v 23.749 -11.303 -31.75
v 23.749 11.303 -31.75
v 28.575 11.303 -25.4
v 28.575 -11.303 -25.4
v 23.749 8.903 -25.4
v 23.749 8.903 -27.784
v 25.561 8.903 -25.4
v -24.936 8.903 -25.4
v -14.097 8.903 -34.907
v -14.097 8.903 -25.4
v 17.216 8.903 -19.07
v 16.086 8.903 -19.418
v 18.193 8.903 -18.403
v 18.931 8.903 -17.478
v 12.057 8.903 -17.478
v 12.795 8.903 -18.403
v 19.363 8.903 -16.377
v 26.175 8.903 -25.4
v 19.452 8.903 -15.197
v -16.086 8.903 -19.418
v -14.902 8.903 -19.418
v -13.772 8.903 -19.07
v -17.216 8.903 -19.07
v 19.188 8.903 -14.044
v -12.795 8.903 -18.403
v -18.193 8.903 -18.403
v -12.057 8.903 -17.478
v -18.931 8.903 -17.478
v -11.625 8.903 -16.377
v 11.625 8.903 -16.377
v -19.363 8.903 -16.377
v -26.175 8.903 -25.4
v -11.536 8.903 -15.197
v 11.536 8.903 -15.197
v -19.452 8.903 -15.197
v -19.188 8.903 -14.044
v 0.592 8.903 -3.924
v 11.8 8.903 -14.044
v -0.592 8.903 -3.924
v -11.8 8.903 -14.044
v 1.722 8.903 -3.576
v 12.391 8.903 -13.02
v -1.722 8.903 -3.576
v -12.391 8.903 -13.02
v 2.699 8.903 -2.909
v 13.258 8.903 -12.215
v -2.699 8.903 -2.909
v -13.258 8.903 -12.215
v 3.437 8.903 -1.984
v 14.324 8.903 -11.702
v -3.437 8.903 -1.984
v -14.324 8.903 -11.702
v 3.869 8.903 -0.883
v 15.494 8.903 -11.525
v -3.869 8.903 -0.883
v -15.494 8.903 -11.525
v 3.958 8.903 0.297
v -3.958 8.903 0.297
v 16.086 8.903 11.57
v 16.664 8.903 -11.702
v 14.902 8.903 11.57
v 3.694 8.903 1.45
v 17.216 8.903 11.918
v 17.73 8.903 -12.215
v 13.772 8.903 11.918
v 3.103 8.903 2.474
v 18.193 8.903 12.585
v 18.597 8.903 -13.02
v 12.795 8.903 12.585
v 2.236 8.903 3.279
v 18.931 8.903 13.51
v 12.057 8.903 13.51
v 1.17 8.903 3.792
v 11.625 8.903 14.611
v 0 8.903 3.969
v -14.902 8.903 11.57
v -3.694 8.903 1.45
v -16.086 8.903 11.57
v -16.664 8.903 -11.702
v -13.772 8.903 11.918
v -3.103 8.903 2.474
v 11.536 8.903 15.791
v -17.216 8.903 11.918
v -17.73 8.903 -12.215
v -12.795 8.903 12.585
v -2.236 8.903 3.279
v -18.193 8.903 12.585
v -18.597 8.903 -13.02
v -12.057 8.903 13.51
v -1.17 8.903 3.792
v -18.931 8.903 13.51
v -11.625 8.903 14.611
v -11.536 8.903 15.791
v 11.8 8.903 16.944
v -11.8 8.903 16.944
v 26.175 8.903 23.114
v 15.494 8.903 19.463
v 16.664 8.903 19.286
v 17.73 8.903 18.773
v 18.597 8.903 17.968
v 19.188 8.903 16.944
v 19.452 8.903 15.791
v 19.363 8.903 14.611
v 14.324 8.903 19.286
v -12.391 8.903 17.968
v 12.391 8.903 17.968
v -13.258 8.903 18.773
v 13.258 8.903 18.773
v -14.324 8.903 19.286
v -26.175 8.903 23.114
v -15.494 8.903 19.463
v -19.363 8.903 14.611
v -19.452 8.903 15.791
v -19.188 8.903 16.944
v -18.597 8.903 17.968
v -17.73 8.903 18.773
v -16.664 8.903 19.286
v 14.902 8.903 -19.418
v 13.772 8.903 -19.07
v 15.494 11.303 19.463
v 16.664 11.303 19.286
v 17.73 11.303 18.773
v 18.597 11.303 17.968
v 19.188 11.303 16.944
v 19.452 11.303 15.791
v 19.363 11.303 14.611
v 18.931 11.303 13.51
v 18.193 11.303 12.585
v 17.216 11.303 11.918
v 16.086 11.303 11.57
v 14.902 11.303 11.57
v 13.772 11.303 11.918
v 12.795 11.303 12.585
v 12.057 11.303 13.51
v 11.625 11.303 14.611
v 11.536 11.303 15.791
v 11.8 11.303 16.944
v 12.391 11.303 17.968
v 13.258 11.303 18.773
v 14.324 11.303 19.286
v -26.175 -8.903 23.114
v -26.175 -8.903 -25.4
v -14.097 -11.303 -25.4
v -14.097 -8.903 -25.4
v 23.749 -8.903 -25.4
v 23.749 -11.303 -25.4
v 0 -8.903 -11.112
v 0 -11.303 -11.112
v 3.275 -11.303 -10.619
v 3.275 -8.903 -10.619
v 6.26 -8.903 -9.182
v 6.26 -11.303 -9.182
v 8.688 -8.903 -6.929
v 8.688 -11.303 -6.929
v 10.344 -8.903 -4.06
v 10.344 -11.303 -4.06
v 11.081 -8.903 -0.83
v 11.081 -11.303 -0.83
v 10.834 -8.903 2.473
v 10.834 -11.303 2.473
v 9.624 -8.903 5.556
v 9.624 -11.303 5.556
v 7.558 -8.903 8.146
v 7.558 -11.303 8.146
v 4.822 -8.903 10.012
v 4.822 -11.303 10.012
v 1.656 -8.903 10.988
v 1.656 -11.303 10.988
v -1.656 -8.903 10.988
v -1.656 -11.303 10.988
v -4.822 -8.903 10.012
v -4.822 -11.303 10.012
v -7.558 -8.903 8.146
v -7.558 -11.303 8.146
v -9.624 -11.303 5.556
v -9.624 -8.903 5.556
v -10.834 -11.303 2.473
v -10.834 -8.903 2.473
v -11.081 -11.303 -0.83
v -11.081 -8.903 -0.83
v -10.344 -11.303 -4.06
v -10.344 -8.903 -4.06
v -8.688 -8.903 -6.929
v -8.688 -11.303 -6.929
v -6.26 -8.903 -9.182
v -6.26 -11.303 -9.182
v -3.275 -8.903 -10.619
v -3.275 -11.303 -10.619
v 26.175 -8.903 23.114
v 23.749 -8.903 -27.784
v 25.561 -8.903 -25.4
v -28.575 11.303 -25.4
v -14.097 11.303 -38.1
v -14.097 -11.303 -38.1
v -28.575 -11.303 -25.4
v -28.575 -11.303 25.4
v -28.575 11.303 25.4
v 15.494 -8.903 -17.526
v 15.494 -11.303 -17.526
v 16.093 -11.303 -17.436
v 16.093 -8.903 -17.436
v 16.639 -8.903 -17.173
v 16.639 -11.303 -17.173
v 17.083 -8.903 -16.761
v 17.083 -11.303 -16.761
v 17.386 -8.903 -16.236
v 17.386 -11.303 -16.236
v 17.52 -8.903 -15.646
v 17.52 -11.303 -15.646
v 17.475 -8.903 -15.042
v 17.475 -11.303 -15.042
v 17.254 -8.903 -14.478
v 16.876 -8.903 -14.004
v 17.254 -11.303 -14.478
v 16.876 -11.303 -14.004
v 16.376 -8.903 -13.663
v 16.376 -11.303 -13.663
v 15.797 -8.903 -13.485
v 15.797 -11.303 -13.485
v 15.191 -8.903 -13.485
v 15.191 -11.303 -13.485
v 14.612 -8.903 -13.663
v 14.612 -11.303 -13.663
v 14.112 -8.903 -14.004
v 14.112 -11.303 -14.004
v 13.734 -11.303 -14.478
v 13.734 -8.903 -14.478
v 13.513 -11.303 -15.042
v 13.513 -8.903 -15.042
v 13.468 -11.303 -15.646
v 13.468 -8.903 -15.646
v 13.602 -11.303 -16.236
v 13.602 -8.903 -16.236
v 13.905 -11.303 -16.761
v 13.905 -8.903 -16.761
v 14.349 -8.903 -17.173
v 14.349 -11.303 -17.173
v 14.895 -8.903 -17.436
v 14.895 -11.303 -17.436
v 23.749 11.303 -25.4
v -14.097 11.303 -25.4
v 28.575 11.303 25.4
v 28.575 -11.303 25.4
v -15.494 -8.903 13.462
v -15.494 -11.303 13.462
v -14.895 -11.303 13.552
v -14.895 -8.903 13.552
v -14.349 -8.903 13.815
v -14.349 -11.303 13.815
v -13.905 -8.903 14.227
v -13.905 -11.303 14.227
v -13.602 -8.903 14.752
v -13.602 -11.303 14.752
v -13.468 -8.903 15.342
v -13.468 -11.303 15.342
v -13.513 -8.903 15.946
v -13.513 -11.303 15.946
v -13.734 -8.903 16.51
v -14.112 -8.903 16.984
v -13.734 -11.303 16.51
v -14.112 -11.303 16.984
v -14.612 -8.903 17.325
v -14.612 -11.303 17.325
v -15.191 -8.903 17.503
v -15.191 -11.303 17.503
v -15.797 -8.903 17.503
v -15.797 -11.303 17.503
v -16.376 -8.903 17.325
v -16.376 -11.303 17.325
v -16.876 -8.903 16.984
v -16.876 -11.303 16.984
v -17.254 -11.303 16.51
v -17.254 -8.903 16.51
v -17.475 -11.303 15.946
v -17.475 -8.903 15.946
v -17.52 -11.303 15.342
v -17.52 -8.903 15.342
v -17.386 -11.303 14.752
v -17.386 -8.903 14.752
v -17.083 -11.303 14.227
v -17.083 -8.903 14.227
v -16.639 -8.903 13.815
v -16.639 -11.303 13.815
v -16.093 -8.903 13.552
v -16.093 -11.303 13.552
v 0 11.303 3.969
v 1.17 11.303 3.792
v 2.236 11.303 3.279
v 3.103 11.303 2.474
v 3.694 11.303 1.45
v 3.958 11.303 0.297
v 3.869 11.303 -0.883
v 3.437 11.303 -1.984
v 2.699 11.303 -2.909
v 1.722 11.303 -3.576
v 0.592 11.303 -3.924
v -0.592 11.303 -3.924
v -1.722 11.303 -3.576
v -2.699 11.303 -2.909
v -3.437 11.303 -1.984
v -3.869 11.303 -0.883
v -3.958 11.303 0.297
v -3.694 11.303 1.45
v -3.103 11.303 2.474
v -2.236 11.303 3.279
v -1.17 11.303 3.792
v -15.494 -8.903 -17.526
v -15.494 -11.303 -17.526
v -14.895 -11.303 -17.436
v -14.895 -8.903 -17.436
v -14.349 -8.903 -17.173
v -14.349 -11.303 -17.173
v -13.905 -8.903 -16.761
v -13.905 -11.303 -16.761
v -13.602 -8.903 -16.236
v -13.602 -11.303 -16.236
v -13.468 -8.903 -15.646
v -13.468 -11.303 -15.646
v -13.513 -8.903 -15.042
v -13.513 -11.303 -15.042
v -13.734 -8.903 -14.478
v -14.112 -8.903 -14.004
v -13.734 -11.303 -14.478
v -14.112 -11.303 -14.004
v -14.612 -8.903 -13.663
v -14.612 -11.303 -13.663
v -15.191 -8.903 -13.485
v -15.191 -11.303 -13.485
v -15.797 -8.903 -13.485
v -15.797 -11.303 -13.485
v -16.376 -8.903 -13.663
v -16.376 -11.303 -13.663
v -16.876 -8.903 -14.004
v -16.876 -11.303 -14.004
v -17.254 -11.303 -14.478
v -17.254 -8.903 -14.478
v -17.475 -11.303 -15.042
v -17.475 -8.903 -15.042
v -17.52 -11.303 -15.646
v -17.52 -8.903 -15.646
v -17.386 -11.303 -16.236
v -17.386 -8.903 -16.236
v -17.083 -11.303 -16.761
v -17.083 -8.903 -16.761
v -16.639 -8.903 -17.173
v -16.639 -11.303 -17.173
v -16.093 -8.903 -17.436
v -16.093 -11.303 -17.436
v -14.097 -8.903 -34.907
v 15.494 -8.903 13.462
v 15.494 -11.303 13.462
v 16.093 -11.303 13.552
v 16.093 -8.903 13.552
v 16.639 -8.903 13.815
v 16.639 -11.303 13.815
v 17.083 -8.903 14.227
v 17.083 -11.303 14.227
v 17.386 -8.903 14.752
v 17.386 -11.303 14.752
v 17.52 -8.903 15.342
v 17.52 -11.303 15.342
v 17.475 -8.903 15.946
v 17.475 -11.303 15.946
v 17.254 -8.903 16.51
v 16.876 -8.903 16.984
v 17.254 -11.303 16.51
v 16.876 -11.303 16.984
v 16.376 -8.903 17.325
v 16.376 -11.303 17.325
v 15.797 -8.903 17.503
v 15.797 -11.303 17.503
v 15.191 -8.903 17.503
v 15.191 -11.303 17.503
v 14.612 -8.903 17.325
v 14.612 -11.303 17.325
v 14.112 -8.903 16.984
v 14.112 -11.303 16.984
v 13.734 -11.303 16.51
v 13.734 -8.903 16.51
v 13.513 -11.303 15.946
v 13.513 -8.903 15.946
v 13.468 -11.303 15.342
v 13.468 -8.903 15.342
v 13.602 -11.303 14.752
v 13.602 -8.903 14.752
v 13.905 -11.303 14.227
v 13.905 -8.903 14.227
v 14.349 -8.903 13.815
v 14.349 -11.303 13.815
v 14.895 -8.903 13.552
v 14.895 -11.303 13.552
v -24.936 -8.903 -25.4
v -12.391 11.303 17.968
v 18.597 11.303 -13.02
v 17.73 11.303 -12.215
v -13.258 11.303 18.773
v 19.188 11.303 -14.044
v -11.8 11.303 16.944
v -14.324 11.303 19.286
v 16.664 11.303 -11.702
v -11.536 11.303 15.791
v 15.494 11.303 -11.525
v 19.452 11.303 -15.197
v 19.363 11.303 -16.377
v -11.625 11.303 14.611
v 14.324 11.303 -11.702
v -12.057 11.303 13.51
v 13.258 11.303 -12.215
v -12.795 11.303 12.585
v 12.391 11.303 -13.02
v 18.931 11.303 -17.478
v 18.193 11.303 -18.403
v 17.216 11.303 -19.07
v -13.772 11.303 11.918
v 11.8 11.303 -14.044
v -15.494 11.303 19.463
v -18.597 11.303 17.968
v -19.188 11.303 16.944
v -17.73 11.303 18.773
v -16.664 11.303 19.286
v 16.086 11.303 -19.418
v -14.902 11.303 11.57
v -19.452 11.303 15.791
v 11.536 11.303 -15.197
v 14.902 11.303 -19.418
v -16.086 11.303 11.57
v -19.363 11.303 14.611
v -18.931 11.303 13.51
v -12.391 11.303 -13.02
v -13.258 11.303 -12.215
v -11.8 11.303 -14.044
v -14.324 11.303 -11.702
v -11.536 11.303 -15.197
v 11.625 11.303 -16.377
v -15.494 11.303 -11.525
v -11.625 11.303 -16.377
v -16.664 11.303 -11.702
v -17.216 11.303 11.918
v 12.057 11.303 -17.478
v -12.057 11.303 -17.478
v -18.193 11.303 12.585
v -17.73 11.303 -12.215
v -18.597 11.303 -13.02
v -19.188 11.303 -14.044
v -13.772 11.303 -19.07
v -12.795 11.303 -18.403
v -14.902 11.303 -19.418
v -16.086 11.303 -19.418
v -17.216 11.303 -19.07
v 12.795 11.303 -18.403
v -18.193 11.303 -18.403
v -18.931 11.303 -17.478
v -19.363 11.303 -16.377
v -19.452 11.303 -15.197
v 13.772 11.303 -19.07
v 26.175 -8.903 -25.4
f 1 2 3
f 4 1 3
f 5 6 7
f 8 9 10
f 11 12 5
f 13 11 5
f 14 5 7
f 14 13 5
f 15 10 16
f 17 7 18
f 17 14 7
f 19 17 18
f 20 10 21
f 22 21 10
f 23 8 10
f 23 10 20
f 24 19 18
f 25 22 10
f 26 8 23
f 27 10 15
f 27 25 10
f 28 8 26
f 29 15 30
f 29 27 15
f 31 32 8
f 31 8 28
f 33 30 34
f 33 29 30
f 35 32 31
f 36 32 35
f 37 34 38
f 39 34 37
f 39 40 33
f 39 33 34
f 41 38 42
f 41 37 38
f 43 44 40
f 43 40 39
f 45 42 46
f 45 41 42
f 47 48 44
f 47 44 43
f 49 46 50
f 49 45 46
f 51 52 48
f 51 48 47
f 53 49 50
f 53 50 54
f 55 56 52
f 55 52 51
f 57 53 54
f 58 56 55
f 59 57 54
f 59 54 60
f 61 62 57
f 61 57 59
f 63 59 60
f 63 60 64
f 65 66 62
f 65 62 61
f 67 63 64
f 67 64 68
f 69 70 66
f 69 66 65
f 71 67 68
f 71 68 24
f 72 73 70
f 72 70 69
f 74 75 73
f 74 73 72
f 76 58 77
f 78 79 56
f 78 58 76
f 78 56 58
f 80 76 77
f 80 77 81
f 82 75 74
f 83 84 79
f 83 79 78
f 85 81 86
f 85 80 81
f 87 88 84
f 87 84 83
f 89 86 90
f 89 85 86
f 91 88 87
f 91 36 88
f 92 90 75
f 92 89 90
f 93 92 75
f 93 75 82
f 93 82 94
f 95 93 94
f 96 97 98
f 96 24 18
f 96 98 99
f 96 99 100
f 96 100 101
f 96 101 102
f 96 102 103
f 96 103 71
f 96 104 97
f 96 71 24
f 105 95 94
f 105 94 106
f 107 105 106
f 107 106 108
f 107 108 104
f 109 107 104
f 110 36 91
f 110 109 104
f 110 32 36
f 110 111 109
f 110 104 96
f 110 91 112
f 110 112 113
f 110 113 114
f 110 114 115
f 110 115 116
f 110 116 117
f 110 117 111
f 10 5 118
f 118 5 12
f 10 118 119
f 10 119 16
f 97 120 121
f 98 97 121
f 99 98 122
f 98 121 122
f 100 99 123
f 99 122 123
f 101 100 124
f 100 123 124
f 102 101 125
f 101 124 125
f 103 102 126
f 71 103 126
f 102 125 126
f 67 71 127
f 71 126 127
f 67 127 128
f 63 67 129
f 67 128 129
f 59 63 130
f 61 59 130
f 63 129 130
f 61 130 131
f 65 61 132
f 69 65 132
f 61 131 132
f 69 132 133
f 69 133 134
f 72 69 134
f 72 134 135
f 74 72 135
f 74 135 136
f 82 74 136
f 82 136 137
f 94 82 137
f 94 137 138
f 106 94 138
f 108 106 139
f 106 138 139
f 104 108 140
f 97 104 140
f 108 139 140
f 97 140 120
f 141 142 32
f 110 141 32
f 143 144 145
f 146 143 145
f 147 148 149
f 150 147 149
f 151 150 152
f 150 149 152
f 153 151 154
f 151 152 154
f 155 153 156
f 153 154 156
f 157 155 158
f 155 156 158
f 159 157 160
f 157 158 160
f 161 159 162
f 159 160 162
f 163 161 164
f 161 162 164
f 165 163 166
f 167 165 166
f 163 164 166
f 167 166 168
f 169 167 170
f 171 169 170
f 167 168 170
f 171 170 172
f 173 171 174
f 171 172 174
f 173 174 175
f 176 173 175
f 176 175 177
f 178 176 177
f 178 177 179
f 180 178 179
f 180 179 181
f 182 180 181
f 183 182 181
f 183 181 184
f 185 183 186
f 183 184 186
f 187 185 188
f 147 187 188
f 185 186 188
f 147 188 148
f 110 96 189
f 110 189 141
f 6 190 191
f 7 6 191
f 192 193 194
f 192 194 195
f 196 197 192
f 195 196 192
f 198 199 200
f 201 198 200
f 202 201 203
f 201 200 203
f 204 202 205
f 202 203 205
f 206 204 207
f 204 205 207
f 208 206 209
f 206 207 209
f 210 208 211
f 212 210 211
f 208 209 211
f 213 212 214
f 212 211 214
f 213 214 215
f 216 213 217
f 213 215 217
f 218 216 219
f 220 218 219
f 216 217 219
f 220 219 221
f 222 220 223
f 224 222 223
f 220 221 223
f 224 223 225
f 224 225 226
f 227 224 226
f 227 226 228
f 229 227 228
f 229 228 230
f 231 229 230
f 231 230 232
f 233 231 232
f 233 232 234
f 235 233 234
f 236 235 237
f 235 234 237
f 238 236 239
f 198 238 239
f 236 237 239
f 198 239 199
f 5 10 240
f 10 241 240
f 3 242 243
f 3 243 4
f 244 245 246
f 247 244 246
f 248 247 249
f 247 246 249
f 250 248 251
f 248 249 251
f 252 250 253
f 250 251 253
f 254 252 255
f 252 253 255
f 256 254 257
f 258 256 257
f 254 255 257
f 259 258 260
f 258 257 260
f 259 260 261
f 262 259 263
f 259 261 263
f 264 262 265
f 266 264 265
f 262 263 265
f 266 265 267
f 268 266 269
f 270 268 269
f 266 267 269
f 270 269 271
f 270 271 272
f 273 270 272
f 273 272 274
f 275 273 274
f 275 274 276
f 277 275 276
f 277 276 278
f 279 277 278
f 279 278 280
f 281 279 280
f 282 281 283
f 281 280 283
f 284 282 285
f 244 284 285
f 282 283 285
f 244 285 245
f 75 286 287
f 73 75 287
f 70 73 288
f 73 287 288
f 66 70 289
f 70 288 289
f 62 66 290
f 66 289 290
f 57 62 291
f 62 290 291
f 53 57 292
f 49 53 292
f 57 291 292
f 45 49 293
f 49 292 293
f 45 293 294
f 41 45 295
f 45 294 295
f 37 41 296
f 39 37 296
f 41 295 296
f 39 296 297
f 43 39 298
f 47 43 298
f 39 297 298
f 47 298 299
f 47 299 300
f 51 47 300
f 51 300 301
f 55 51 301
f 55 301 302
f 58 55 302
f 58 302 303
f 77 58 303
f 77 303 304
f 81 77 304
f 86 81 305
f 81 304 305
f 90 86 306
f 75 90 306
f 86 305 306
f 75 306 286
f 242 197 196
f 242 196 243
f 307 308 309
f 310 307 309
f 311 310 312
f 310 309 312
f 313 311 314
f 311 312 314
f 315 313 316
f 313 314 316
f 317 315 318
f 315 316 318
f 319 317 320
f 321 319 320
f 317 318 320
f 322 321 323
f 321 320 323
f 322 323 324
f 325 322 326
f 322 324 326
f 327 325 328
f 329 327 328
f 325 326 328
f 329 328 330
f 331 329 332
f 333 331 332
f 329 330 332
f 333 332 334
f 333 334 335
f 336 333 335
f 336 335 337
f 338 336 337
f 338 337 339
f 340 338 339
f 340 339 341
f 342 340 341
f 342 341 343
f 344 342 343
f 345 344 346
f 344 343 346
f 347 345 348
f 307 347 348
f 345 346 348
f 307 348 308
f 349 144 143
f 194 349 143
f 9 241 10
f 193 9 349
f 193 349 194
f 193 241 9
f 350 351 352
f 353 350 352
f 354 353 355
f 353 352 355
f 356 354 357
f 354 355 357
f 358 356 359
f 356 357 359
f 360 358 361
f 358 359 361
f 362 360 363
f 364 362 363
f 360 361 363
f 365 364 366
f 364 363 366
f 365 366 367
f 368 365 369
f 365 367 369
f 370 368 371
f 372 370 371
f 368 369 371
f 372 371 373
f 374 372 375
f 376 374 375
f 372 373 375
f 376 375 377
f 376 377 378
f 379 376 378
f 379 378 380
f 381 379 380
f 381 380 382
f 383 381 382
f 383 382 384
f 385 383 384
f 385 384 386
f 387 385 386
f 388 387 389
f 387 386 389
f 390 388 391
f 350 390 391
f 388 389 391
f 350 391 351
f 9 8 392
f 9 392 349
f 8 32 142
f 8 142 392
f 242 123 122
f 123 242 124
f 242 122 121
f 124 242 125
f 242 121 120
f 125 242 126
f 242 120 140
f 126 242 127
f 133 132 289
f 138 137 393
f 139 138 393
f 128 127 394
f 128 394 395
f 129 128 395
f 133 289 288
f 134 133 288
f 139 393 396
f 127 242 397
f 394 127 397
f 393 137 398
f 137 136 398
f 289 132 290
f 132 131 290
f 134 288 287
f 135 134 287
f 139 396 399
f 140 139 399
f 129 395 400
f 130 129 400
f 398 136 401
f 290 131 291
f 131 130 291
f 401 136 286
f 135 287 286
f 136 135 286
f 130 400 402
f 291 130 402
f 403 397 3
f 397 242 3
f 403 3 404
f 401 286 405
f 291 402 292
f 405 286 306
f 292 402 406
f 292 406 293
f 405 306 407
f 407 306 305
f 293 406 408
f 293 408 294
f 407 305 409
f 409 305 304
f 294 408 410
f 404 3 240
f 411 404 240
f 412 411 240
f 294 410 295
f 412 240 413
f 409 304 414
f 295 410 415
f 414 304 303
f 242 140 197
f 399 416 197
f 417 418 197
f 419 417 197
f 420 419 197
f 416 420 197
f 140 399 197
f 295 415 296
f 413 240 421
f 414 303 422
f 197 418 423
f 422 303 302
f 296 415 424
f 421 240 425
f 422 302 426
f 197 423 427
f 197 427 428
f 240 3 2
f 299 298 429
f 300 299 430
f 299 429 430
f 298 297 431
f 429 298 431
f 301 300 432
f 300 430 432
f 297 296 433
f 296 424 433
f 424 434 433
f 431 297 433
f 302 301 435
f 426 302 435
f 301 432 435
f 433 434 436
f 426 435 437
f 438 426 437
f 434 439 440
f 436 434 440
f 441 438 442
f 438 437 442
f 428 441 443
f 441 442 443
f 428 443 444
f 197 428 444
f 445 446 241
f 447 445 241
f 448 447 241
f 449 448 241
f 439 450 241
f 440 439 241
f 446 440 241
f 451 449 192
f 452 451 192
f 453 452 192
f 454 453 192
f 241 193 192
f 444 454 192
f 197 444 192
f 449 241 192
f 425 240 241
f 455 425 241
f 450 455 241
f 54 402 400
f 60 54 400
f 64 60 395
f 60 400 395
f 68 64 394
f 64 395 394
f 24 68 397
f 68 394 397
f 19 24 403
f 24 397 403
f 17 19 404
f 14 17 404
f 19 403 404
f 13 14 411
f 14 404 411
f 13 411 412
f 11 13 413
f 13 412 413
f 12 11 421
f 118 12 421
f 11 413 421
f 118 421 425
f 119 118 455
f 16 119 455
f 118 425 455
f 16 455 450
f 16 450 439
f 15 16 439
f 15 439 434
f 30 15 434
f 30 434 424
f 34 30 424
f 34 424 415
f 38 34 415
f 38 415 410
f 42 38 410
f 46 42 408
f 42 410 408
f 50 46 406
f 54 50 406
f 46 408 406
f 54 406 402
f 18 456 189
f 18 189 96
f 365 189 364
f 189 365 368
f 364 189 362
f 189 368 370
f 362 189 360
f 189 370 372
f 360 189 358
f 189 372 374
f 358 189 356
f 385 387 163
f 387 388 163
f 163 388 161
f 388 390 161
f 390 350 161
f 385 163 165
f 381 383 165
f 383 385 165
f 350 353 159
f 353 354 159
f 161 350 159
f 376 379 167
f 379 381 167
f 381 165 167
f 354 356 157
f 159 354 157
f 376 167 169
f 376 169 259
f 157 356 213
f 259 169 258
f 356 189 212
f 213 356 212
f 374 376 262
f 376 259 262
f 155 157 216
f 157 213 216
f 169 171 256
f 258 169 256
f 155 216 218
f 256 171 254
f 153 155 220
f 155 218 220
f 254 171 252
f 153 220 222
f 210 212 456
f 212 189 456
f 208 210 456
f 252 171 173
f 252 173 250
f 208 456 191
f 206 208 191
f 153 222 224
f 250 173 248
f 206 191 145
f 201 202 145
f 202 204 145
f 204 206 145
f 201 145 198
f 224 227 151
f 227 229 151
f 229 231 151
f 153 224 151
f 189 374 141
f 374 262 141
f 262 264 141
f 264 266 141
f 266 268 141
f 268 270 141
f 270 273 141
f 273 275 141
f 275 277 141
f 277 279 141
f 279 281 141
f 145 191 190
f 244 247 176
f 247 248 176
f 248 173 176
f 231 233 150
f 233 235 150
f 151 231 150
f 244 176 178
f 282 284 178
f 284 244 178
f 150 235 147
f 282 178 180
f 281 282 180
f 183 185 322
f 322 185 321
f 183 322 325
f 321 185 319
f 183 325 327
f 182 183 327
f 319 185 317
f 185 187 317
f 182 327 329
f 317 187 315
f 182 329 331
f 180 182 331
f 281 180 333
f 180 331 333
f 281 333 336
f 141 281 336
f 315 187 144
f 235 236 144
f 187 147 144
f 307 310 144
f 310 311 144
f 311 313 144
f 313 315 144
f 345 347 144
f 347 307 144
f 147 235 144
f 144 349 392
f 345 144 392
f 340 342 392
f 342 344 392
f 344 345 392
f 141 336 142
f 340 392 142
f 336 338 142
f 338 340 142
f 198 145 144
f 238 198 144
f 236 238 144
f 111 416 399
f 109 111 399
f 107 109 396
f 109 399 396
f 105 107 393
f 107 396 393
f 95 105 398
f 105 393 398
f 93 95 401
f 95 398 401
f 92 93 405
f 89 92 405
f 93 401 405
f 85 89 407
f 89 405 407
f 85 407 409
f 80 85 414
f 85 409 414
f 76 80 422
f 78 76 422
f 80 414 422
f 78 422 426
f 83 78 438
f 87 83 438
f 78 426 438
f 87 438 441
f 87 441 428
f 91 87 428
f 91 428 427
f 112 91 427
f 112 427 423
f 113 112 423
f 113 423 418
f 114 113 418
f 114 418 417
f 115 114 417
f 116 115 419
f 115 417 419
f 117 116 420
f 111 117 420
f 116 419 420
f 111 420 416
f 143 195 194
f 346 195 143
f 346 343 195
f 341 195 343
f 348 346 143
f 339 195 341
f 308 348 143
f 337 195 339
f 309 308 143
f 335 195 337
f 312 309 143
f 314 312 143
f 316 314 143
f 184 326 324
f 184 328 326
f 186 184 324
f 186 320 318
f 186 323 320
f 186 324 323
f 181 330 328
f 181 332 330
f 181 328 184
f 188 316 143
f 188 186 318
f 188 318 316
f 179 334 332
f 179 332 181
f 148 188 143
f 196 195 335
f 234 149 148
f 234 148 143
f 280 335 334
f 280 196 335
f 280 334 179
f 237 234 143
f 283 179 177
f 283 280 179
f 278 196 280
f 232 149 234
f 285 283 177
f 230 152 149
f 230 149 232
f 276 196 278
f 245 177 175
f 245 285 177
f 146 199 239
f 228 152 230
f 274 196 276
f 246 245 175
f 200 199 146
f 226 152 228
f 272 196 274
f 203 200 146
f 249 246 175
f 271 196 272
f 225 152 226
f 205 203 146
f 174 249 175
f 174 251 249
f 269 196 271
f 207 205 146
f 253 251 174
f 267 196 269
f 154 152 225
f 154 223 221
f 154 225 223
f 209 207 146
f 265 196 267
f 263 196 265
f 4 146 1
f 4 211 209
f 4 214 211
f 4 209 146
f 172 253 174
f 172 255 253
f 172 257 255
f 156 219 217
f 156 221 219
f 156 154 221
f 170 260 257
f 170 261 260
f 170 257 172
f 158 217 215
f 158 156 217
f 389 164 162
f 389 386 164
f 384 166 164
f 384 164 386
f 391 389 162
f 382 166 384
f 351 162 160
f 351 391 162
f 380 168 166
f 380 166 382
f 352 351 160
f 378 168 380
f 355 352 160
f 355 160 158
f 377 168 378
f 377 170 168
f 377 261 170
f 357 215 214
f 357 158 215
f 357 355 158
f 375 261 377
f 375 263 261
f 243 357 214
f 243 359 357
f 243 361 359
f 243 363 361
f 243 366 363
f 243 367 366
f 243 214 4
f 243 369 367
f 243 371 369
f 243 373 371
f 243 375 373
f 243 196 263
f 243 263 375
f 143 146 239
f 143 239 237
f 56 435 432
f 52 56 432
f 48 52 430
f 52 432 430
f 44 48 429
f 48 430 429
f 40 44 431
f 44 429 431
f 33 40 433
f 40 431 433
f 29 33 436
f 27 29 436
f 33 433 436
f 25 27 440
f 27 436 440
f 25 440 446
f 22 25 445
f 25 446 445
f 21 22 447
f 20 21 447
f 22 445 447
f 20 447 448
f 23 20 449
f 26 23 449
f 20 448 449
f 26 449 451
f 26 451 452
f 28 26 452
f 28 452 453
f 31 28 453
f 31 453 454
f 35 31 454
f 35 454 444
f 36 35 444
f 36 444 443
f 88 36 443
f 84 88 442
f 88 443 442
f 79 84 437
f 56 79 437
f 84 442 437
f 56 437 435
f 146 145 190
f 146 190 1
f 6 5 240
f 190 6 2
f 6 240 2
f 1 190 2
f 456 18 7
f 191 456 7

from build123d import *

# Parameters (mm, degrees)
SKETCH1_W           = 57.15
SKETCH1_H           = 50.8
BOSS_EXTRUDE1_DEPTH = 11.303
SKETCH2_W           = 52.350000456
SKETCH2_H           = 17.806000456
CUT_EXTRUDE1_DEPTH  = 48.514
SKETCH3_R           = 2.032
SKETCH3_R_2         = 11.1125
CUT_EXTRUDE2_DEPTH  = 2.399999772
SKETCH4_R           = 3.96875
CUT_EXTRUDE3_DEPTH  = 2.399999772
BOSS_EXTRUDE2_REACH = 46.415
SHELL1_START        = -35.538117353
SHELL1_OUTLINE_W    = 14.41756603
SHELL1_OUTLINE_H    = 17.806000456
SHELL1_DEPTH        = 8.538117353
SHELL2_START        = 34.277170944
SHELL2_OUTLINE_W    = 2.993867518
SHELL2_OUTLINE_H    = 17.806000456
SHELL2_DEPTH        = 1.442278976


with BuildPart() as part:
    # Sketch1 → Boss-Extrude1 (new, symmetric)
    with BuildSketch(Plane(origin=(0, 0, 0), x_dir=(1, 0, 0), z_dir=(0, 1, 0))):
        Rectangle(SKETCH1_W, SKETCH1_H)
    extrude(amount=BOSS_EXTRUDE1_DEPTH, both=True)

    # Sketch2 → Cut-Extrude1 (cut)
    with BuildSketch(Plane(origin=(0, 0, -25.4), x_dir=(-1, 0, 0), z_dir=(0, 0, -1))):
        Rectangle(SKETCH2_W, SKETCH2_H)
    extrude(amount=-CUT_EXTRUDE1_DEPTH, mode=Mode.SUBTRACT)

    # Sketch3 → Cut-Extrude2 (cut)
    with BuildSketch(Plane.XZ.offset(11.303)):
        with Locations(Location((-15.494, 15.494, 0), (0, 0, 270))):
            Circle(SKETCH3_R)
        with Locations(Location((15.494, 15.494, 0), (0, 0, 270))):
            Circle(SKETCH3_R)
        with Locations(Location((15.494, -15.494, 0), (0, 0, 270))):
            Circle(SKETCH3_R)
        with Locations(Location((-15.494, -15.494, 0), (0, 0, 270))):
            Circle(SKETCH3_R)
        with Locations(Location((0, 0, 0), (0, 0, 270))):
            Circle(SKETCH3_R_2)
    extrude(amount=-CUT_EXTRUDE2_DEPTH, mode=Mode.SUBTRACT)

    # Sketch4 → Cut-Extrude3 (cut)
    with BuildSketch(Plane(origin=(0, 11.303, 0), x_dir=(1, 0, 0), z_dir=(0, 1, 0))):
        with Locations(Location((-15.494, 15.494, 0), (0, 0, 270))):
            Circle(SKETCH4_R)
        with Locations(Location((15.494, 15.494, 0), (0, 0, 270))):
            Circle(SKETCH4_R)
        with Locations(Location((15.494, -15.494, 0), (0, 0, 270))):
            Circle(SKETCH4_R)
        with Locations(Location((-15.494, -15.494, 0), (0, 0, 270))):
            Circle(SKETCH4_R)
        with Locations(Location((0, 0, 0), (0, 0, 270))):
            Circle(SKETCH4_R)
    extrude(amount=-CUT_EXTRUDE3_DEPTH, mode=Mode.SUBTRACT)

    # Boss-Extrude2: up to this face of the body (flat: up to its plane)
    boss_extrude2_end = Plane(part.part.faces().sort_by_distance((0, -11.303, -24.635358744))[0])
    # Sketch5 → Boss-Extrude2 (add, up to the picked face)
    with BuildSketch(Plane(origin=(0, 11.303, 0), x_dir=(1, 0, 0), z_dir=(0, 1, 0)), mode=Mode.PRIVATE) as boss_extrude2_sk1:
        Polygon((-28.575, 25.4), (-14.097, 25.4), (-14.097, 38.1), align=None)
    boss_extrude2_tool1 = split(extrude(boss_extrude2_sk1.sketch, amount=-BOSS_EXTRUDE2_REACH, mode=Mode.PRIVATE), bisect_by=boss_extrude2_end, keep=Keep.BOTH, mode=Mode.PRIVATE)
    # Sketch5 → Boss-Extrude2 (add, up to the picked face)
    with BuildSketch(Plane(origin=(0, 11.303, 0), x_dir=(1, 0, 0), z_dir=(0, 1, 0)), mode=Mode.PRIVATE) as boss_extrude2_sk2:
        Polygon((28.575, 25.4), (23.749, 25.4), (23.749, 31.75), align=None)
    boss_extrude2_tool2 = split(extrude(boss_extrude2_sk2.sketch, amount=-BOSS_EXTRUDE2_REACH, mode=Mode.PRIVATE), bisect_by=boss_extrude2_end, keep=Keep.BOTH, mode=Mode.PRIVATE)
    add(boss_extrude2_tool1.solids().sort_by(Axis((-18.923, 11.303, -29.633333), (0, -1, 0)))[0])
    add(boss_extrude2_tool2.solids().sort_by(Axis((25.357667, 11.303, -27.516667), (0, -1, 0)))[0])

    # Shell1: read off the stored shape, not the designer's step
    # Shell1 outline → Shell1 (cut)
    with BuildSketch(Plane(origin=(0, 0, 0), x_dir=(0.7517591128712744, 0, -0.6594378183081364), z_dir=(0.6594378183081363, 0, 0.7517591128712744)).offset(SHELL1_START)):
        with Locations((5.21298669, 0)):
            Rectangle(SHELL1_OUTLINE_W, SHELL1_OUTLINE_H)
    extrude(amount=SHELL1_DEPTH, mode=Mode.SUBTRACT)

    # Shell2: read off the stored shape, not the designer's step
    # Shell2 outline → Shell2 (cut)
    with BuildSketch(Plane(origin=(0, 0, 0), x_dir=(0.6050832675335581, 0, 0.7961621941231024), z_dir=(0.7961621941231023, 0, -0.6050832675335583)).offset(SHELL2_START)):
        with Locations((-6.253198947, 0)):
            Rectangle(SHELL2_OUTLINE_W, SHELL2_OUTLINE_H)
    extrude(amount=SHELL2_DEPTH, mode=Mode.SUBTRACT)


solid = part.part
